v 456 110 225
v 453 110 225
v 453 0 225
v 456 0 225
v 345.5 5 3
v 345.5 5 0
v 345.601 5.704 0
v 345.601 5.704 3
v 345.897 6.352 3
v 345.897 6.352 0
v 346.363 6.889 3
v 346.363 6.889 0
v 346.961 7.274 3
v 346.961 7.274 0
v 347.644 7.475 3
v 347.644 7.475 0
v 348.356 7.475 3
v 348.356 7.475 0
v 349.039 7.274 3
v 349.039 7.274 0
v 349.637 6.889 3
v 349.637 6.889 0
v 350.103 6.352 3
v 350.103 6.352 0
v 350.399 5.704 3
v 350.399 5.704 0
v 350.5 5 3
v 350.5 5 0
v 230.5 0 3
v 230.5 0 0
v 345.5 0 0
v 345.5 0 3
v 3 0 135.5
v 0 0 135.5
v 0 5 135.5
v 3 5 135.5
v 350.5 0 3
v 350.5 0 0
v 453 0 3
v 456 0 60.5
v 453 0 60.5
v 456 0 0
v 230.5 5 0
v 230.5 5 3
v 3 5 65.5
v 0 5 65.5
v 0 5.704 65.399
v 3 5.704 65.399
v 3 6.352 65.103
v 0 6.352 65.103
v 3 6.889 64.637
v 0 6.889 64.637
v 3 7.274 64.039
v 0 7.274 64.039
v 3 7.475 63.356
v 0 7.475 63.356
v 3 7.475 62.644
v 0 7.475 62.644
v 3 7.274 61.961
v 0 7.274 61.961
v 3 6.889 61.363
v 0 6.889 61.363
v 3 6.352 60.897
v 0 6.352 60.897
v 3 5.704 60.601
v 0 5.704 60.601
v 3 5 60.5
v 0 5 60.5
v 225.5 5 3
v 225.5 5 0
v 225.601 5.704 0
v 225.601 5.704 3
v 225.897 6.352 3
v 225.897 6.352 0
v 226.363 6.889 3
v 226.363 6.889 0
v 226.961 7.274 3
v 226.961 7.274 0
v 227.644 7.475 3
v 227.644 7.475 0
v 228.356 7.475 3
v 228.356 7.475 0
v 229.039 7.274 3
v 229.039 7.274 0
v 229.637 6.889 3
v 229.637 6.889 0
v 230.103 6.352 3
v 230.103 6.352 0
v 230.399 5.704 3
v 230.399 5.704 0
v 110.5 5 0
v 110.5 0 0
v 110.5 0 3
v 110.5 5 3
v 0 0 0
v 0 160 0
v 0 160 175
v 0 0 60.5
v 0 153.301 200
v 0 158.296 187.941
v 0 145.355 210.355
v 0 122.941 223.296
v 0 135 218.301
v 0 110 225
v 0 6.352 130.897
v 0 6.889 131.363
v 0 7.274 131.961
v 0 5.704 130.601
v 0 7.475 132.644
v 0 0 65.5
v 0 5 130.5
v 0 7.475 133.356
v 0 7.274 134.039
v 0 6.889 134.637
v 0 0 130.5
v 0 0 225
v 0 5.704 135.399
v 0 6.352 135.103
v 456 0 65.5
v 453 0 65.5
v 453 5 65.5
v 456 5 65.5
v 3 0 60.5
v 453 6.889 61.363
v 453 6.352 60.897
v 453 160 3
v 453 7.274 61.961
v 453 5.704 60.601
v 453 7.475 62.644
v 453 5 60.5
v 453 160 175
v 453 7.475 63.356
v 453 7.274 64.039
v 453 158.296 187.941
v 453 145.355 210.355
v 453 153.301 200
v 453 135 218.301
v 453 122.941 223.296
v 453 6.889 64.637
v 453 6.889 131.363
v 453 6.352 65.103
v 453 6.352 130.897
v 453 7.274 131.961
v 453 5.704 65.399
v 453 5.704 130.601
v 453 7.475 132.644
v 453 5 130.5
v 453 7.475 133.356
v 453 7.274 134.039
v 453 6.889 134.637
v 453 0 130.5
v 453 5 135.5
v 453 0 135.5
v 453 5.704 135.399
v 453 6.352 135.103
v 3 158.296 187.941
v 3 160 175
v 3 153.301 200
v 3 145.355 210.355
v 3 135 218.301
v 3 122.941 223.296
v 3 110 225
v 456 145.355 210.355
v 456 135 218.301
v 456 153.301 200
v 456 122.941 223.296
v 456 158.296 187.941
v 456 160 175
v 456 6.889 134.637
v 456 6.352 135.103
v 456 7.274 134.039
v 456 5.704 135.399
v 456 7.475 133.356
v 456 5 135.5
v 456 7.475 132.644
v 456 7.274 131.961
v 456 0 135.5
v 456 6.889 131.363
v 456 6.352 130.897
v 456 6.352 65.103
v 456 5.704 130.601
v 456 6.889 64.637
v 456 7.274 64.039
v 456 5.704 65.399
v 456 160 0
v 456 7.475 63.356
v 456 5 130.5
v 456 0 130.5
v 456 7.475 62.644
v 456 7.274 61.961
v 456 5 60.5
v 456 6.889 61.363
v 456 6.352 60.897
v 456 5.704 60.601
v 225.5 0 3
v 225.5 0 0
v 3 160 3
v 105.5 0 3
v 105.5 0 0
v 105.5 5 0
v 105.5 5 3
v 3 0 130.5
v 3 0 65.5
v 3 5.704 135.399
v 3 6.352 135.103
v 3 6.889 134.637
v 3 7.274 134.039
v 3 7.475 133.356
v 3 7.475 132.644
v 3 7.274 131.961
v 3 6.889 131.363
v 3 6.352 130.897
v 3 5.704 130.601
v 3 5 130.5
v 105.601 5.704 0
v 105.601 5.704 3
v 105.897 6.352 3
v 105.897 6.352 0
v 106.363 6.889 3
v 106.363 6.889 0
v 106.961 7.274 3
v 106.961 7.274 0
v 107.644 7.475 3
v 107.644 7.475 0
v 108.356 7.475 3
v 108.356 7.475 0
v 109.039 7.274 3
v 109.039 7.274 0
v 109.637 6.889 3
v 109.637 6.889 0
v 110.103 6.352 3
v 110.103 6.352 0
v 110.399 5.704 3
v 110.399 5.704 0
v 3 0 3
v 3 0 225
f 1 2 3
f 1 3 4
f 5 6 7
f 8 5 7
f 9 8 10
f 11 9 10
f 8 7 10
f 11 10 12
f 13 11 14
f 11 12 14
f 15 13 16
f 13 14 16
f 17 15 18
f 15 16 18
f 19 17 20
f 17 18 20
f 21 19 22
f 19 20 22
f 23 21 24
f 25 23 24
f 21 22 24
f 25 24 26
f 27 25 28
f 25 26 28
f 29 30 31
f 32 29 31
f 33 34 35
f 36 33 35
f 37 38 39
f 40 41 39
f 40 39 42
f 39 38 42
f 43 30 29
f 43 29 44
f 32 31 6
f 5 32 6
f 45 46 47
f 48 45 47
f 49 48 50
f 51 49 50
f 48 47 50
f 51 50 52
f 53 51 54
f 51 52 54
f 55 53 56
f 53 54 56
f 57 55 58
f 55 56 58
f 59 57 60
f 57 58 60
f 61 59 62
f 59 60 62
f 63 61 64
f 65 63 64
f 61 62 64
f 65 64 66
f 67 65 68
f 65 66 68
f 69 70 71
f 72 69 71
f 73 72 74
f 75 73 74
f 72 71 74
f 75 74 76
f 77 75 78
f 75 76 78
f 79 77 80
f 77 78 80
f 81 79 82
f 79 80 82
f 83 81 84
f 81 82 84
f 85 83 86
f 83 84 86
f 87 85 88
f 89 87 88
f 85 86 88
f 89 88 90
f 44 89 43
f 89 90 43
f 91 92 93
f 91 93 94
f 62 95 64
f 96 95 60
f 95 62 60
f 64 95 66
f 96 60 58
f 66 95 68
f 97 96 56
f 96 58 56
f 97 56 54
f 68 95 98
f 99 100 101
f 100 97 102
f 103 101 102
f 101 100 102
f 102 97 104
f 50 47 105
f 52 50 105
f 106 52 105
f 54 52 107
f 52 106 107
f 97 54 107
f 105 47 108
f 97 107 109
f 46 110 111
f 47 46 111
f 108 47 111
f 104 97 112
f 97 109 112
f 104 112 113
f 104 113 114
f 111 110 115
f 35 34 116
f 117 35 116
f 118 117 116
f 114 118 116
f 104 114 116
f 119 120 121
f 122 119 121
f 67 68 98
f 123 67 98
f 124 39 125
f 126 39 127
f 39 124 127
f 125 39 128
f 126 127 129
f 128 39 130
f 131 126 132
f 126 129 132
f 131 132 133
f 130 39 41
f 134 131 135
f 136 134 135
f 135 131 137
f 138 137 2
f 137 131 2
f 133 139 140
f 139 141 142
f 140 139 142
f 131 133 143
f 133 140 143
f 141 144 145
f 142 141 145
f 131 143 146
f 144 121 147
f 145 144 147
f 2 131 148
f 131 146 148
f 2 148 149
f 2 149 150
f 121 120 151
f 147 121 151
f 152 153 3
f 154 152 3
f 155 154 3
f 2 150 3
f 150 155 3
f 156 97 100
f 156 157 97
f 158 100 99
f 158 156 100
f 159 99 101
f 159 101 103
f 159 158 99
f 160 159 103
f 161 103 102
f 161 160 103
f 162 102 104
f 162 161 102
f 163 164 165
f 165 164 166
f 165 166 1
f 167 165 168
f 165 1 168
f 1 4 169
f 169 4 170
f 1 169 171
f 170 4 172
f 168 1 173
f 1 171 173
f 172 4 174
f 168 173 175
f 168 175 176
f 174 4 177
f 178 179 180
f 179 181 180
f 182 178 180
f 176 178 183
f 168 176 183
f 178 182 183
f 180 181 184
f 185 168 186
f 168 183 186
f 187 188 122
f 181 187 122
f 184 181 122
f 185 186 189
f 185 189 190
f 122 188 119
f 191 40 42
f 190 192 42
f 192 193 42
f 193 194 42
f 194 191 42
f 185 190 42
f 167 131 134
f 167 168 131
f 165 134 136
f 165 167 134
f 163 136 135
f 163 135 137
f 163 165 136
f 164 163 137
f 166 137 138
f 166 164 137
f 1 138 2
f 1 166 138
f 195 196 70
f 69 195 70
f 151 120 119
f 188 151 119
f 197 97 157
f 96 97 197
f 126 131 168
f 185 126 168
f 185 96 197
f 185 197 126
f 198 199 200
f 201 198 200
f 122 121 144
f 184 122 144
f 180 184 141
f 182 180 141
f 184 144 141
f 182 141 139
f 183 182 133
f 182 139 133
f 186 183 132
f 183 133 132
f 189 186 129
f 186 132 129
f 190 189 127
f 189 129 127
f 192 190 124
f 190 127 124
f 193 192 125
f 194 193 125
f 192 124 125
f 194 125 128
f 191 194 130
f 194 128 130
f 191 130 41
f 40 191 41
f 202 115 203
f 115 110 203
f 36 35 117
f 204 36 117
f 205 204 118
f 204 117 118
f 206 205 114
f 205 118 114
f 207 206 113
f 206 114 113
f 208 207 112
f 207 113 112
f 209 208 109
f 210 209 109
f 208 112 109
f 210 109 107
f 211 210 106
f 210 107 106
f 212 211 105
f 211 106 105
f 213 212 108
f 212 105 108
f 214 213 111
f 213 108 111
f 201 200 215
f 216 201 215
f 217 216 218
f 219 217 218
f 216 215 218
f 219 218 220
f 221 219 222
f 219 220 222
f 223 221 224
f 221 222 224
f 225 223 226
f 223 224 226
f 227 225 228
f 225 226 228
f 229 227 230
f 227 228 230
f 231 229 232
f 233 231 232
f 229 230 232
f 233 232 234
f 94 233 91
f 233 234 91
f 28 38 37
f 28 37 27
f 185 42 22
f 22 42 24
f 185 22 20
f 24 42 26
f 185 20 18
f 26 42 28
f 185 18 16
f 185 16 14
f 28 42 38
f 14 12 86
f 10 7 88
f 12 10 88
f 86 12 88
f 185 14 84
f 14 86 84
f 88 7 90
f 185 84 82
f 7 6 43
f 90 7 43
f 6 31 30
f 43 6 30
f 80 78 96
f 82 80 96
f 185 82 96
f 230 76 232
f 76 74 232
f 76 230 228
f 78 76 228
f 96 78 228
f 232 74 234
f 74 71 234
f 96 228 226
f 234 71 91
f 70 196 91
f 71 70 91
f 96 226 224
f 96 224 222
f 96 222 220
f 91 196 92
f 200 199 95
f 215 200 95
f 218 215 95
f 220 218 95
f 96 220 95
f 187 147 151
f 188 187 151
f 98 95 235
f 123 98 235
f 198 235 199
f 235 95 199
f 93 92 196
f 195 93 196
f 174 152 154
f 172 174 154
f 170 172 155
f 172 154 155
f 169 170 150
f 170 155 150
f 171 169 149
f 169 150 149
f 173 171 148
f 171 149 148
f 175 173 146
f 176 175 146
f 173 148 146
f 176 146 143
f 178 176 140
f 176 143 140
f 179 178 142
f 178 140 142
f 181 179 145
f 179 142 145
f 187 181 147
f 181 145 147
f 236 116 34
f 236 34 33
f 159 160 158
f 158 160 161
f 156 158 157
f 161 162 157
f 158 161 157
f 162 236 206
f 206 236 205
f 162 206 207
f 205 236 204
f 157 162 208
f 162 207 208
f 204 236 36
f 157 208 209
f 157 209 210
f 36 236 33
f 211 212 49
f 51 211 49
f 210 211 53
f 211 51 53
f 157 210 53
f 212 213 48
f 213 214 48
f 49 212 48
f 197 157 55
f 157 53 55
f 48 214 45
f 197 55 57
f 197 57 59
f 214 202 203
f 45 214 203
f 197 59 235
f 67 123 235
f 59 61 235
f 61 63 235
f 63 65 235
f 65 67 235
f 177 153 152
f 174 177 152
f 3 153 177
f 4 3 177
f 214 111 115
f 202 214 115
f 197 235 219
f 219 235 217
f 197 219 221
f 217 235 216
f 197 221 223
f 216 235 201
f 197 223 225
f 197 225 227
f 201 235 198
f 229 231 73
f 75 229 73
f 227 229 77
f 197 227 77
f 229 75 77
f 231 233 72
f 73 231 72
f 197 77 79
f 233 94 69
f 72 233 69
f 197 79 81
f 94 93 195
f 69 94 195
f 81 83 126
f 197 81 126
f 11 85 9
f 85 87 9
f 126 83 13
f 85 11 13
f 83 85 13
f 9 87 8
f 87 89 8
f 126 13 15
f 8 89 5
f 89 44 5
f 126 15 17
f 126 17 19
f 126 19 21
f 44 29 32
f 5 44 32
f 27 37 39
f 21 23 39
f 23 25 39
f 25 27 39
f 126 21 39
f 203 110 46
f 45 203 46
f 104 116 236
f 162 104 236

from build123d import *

# Parameters (mm, degrees)
SALIENTE_EXTRUIR1_DEPTH = 160
CORTAR_EXTRUIR1_DEPTH   = 456
CORTAR_EXTRUIR2_REACH   = 227
CROQUIS3_R              = 2.5
CROQUIS3_W              = 5
CROQUIS3_H              = 5
REDONDEO1_R             = 50


with BuildPart() as part:
    # Croquis1 → Saliente-Extruir1 (new body)
    with BuildSketch(Plane(origin=(0, 0, 0), x_dir=(1, 0, 0), z_dir=(0, 1, 0))):
        Polygon((3, -225), (3, -3), (453, -3), (453, -225), (456, -225), (456, 0), (0, 0), (0, -225), align=None)
    extrude(amount=SALIENTE_EXTRUIR1_DEPTH)

    # Croquis2 → Cortar-Extruir1 (cut)
    with BuildSketch(Plane.ZY):
        with BuildLine():
            ThreePointArc((65.5, 5), (63, 2.5), (60.5, 5))
            Line((60.5, 5), (60.5, 0))
            Line((60.5, 0), (65.5, 0))
            Line((65.5, 0), (65.5, 5))
        make_face()
        with BuildLine():
            ThreePointArc((65.5, 5), (63, 7.5), (60.5, 5))
            Line((60.5, 5), (65.5, 5))
        make_face()
        with BuildLine():
            Line((65.5, 5), (60.5, 5))
            ThreePointArc((60.5, 5), (63, 2.5), (65.5, 5))
        make_face()
        with BuildLine():
            ThreePointArc((135.5, 5), (133, 7.5), (130.5, 5))
            Line((130.5, 5), (135.5, 5))
        make_face()
        with BuildLine():
            Line((135.5, 5), (130.5, 5))
            ThreePointArc((130.5, 5), (133, 2.5), (135.5, 5))
        make_face()
        with BuildLine():
            Line((130.5, 5), (130.5, 0))
            Line((130.5, 0), (135.5, 0))
            Line((135.5, 0), (135.5, 5))
            ThreePointArc((135.5, 5), (133, 2.5), (130.5, 5))
        make_face()
    extrude(amount=-CORTAR_EXTRUIR1_DEPTH, mode=Mode.SUBTRACT)

    # Croquis3 → Cortar-Extruir2 (cut, up to next)
    with BuildSketch(Plane(origin=(0, 0, 0), x_dir=(-1, 0, 0), z_dir=(0, 0, -1)), mode=Mode.PRIVATE) as cortar_extruir2_sk1:
        with Locations((-348, 5)):
            Circle(CROQUIS3_R)
    cortar_extruir2_tool1 = extrude(cortar_extruir2_sk1.sketch, amount=-CORTAR_EXTRUIR2_REACH, mode=Mode.PRIVATE) & part.part
    add(cortar_extruir2_tool1.solids().sort_by_distance((348, 5, 0))[0], mode=Mode.SUBTRACT)
    # Croquis3 → Cortar-Extruir2 (cut, up to next)
    with BuildSketch(Plane(origin=(0, 0, 0), x_dir=(-1, 0, 0), z_dir=(0, 0, -1)), mode=Mode.PRIVATE) as cortar_extruir2_sk2:
        with Locations((-228, 5)):
            Circle(CROQUIS3_R)
    cortar_extruir2_tool2 = extrude(cortar_extruir2_sk2.sketch, amount=-CORTAR_EXTRUIR2_REACH, mode=Mode.PRIVATE) & part.part
    add(cortar_extruir2_tool2.solids().sort_by_distance((228, 5, 0))[0], mode=Mode.SUBTRACT)
    # Croquis3 → Cortar-Extruir2 (cut, up to next)
    with BuildSketch(Plane(origin=(0, 0, 0), x_dir=(-1, 0, 0), z_dir=(0, 0, -1)), mode=Mode.PRIVATE) as cortar_extruir2_sk3:
        with Locations((-108, 5)):
            Circle(CROQUIS3_R)
    cortar_extruir2_tool3 = extrude(cortar_extruir2_sk3.sketch, amount=-CORTAR_EXTRUIR2_REACH, mode=Mode.PRIVATE) & part.part
    add(cortar_extruir2_tool3.solids().sort_by_distance((108, 5, 0))[0], mode=Mode.SUBTRACT)
    # Croquis3 → Cortar-Extruir2 (cut, up to next)
    with BuildSketch(Plane(origin=(0, 0, 0), x_dir=(-1, 0, 0), z_dir=(0, 0, -1)), mode=Mode.PRIVATE) as cortar_extruir2_sk4:
        with Locations((-228, 2.5)):
            Rectangle(CROQUIS3_W, CROQUIS3_H)
    cortar_extruir2_tool4 = extrude(cortar_extruir2_sk4.sketch, amount=-CORTAR_EXTRUIR2_REACH, mode=Mode.PRIVATE) & part.part
    add(cortar_extruir2_tool4.solids().sort_by_distance((228, 2.5, 0))[0], mode=Mode.SUBTRACT)
    # Croquis3 → Cortar-Extruir2 (cut, up to next)
    with BuildSketch(Plane(origin=(0, 0, 0), x_dir=(-1, 0, 0), z_dir=(0, 0, -1)), mode=Mode.PRIVATE) as cortar_extruir2_sk5:
        with Locations((-108, 2.5)):
            Rectangle(CROQUIS3_W, CROQUIS3_H)
    cortar_extruir2_tool5 = extrude(cortar_extruir2_sk5.sketch, amount=-CORTAR_EXTRUIR2_REACH, mode=Mode.PRIVATE) & part.part
    add(cortar_extruir2_tool5.solids().sort_by_distance((108, 2.5, 0))[0], mode=Mode.SUBTRACT)
    # Croquis3 → Cortar-Extruir2 (cut, up to next)
    with BuildSketch(Plane(origin=(0, 0, 0), x_dir=(-1, 0, 0), z_dir=(0, 0, -1)), mode=Mode.PRIVATE) as cortar_extruir2_sk6:
        with Locations((-348, 2.5)):
            Rectangle(CROQUIS3_W, CROQUIS3_H)
    cortar_extruir2_tool6 = extrude(cortar_extruir2_sk6.sketch, amount=-CORTAR_EXTRUIR2_REACH, mode=Mode.PRIVATE) & part.part
    add(cortar_extruir2_tool6.solids().sort_by_distance((348, 2.5, 0))[0], mode=Mode.SUBTRACT)

    # Redondeo1
    redondeo1_edges = [part.edges().sort_by_distance(p)[0] for p in [
        (454.5, 160, 225),
        (1.5, 160, 225),
    ]]
    fillet(redondeo1_edges, radius=REDONDEO1_R)


solid = part.part
